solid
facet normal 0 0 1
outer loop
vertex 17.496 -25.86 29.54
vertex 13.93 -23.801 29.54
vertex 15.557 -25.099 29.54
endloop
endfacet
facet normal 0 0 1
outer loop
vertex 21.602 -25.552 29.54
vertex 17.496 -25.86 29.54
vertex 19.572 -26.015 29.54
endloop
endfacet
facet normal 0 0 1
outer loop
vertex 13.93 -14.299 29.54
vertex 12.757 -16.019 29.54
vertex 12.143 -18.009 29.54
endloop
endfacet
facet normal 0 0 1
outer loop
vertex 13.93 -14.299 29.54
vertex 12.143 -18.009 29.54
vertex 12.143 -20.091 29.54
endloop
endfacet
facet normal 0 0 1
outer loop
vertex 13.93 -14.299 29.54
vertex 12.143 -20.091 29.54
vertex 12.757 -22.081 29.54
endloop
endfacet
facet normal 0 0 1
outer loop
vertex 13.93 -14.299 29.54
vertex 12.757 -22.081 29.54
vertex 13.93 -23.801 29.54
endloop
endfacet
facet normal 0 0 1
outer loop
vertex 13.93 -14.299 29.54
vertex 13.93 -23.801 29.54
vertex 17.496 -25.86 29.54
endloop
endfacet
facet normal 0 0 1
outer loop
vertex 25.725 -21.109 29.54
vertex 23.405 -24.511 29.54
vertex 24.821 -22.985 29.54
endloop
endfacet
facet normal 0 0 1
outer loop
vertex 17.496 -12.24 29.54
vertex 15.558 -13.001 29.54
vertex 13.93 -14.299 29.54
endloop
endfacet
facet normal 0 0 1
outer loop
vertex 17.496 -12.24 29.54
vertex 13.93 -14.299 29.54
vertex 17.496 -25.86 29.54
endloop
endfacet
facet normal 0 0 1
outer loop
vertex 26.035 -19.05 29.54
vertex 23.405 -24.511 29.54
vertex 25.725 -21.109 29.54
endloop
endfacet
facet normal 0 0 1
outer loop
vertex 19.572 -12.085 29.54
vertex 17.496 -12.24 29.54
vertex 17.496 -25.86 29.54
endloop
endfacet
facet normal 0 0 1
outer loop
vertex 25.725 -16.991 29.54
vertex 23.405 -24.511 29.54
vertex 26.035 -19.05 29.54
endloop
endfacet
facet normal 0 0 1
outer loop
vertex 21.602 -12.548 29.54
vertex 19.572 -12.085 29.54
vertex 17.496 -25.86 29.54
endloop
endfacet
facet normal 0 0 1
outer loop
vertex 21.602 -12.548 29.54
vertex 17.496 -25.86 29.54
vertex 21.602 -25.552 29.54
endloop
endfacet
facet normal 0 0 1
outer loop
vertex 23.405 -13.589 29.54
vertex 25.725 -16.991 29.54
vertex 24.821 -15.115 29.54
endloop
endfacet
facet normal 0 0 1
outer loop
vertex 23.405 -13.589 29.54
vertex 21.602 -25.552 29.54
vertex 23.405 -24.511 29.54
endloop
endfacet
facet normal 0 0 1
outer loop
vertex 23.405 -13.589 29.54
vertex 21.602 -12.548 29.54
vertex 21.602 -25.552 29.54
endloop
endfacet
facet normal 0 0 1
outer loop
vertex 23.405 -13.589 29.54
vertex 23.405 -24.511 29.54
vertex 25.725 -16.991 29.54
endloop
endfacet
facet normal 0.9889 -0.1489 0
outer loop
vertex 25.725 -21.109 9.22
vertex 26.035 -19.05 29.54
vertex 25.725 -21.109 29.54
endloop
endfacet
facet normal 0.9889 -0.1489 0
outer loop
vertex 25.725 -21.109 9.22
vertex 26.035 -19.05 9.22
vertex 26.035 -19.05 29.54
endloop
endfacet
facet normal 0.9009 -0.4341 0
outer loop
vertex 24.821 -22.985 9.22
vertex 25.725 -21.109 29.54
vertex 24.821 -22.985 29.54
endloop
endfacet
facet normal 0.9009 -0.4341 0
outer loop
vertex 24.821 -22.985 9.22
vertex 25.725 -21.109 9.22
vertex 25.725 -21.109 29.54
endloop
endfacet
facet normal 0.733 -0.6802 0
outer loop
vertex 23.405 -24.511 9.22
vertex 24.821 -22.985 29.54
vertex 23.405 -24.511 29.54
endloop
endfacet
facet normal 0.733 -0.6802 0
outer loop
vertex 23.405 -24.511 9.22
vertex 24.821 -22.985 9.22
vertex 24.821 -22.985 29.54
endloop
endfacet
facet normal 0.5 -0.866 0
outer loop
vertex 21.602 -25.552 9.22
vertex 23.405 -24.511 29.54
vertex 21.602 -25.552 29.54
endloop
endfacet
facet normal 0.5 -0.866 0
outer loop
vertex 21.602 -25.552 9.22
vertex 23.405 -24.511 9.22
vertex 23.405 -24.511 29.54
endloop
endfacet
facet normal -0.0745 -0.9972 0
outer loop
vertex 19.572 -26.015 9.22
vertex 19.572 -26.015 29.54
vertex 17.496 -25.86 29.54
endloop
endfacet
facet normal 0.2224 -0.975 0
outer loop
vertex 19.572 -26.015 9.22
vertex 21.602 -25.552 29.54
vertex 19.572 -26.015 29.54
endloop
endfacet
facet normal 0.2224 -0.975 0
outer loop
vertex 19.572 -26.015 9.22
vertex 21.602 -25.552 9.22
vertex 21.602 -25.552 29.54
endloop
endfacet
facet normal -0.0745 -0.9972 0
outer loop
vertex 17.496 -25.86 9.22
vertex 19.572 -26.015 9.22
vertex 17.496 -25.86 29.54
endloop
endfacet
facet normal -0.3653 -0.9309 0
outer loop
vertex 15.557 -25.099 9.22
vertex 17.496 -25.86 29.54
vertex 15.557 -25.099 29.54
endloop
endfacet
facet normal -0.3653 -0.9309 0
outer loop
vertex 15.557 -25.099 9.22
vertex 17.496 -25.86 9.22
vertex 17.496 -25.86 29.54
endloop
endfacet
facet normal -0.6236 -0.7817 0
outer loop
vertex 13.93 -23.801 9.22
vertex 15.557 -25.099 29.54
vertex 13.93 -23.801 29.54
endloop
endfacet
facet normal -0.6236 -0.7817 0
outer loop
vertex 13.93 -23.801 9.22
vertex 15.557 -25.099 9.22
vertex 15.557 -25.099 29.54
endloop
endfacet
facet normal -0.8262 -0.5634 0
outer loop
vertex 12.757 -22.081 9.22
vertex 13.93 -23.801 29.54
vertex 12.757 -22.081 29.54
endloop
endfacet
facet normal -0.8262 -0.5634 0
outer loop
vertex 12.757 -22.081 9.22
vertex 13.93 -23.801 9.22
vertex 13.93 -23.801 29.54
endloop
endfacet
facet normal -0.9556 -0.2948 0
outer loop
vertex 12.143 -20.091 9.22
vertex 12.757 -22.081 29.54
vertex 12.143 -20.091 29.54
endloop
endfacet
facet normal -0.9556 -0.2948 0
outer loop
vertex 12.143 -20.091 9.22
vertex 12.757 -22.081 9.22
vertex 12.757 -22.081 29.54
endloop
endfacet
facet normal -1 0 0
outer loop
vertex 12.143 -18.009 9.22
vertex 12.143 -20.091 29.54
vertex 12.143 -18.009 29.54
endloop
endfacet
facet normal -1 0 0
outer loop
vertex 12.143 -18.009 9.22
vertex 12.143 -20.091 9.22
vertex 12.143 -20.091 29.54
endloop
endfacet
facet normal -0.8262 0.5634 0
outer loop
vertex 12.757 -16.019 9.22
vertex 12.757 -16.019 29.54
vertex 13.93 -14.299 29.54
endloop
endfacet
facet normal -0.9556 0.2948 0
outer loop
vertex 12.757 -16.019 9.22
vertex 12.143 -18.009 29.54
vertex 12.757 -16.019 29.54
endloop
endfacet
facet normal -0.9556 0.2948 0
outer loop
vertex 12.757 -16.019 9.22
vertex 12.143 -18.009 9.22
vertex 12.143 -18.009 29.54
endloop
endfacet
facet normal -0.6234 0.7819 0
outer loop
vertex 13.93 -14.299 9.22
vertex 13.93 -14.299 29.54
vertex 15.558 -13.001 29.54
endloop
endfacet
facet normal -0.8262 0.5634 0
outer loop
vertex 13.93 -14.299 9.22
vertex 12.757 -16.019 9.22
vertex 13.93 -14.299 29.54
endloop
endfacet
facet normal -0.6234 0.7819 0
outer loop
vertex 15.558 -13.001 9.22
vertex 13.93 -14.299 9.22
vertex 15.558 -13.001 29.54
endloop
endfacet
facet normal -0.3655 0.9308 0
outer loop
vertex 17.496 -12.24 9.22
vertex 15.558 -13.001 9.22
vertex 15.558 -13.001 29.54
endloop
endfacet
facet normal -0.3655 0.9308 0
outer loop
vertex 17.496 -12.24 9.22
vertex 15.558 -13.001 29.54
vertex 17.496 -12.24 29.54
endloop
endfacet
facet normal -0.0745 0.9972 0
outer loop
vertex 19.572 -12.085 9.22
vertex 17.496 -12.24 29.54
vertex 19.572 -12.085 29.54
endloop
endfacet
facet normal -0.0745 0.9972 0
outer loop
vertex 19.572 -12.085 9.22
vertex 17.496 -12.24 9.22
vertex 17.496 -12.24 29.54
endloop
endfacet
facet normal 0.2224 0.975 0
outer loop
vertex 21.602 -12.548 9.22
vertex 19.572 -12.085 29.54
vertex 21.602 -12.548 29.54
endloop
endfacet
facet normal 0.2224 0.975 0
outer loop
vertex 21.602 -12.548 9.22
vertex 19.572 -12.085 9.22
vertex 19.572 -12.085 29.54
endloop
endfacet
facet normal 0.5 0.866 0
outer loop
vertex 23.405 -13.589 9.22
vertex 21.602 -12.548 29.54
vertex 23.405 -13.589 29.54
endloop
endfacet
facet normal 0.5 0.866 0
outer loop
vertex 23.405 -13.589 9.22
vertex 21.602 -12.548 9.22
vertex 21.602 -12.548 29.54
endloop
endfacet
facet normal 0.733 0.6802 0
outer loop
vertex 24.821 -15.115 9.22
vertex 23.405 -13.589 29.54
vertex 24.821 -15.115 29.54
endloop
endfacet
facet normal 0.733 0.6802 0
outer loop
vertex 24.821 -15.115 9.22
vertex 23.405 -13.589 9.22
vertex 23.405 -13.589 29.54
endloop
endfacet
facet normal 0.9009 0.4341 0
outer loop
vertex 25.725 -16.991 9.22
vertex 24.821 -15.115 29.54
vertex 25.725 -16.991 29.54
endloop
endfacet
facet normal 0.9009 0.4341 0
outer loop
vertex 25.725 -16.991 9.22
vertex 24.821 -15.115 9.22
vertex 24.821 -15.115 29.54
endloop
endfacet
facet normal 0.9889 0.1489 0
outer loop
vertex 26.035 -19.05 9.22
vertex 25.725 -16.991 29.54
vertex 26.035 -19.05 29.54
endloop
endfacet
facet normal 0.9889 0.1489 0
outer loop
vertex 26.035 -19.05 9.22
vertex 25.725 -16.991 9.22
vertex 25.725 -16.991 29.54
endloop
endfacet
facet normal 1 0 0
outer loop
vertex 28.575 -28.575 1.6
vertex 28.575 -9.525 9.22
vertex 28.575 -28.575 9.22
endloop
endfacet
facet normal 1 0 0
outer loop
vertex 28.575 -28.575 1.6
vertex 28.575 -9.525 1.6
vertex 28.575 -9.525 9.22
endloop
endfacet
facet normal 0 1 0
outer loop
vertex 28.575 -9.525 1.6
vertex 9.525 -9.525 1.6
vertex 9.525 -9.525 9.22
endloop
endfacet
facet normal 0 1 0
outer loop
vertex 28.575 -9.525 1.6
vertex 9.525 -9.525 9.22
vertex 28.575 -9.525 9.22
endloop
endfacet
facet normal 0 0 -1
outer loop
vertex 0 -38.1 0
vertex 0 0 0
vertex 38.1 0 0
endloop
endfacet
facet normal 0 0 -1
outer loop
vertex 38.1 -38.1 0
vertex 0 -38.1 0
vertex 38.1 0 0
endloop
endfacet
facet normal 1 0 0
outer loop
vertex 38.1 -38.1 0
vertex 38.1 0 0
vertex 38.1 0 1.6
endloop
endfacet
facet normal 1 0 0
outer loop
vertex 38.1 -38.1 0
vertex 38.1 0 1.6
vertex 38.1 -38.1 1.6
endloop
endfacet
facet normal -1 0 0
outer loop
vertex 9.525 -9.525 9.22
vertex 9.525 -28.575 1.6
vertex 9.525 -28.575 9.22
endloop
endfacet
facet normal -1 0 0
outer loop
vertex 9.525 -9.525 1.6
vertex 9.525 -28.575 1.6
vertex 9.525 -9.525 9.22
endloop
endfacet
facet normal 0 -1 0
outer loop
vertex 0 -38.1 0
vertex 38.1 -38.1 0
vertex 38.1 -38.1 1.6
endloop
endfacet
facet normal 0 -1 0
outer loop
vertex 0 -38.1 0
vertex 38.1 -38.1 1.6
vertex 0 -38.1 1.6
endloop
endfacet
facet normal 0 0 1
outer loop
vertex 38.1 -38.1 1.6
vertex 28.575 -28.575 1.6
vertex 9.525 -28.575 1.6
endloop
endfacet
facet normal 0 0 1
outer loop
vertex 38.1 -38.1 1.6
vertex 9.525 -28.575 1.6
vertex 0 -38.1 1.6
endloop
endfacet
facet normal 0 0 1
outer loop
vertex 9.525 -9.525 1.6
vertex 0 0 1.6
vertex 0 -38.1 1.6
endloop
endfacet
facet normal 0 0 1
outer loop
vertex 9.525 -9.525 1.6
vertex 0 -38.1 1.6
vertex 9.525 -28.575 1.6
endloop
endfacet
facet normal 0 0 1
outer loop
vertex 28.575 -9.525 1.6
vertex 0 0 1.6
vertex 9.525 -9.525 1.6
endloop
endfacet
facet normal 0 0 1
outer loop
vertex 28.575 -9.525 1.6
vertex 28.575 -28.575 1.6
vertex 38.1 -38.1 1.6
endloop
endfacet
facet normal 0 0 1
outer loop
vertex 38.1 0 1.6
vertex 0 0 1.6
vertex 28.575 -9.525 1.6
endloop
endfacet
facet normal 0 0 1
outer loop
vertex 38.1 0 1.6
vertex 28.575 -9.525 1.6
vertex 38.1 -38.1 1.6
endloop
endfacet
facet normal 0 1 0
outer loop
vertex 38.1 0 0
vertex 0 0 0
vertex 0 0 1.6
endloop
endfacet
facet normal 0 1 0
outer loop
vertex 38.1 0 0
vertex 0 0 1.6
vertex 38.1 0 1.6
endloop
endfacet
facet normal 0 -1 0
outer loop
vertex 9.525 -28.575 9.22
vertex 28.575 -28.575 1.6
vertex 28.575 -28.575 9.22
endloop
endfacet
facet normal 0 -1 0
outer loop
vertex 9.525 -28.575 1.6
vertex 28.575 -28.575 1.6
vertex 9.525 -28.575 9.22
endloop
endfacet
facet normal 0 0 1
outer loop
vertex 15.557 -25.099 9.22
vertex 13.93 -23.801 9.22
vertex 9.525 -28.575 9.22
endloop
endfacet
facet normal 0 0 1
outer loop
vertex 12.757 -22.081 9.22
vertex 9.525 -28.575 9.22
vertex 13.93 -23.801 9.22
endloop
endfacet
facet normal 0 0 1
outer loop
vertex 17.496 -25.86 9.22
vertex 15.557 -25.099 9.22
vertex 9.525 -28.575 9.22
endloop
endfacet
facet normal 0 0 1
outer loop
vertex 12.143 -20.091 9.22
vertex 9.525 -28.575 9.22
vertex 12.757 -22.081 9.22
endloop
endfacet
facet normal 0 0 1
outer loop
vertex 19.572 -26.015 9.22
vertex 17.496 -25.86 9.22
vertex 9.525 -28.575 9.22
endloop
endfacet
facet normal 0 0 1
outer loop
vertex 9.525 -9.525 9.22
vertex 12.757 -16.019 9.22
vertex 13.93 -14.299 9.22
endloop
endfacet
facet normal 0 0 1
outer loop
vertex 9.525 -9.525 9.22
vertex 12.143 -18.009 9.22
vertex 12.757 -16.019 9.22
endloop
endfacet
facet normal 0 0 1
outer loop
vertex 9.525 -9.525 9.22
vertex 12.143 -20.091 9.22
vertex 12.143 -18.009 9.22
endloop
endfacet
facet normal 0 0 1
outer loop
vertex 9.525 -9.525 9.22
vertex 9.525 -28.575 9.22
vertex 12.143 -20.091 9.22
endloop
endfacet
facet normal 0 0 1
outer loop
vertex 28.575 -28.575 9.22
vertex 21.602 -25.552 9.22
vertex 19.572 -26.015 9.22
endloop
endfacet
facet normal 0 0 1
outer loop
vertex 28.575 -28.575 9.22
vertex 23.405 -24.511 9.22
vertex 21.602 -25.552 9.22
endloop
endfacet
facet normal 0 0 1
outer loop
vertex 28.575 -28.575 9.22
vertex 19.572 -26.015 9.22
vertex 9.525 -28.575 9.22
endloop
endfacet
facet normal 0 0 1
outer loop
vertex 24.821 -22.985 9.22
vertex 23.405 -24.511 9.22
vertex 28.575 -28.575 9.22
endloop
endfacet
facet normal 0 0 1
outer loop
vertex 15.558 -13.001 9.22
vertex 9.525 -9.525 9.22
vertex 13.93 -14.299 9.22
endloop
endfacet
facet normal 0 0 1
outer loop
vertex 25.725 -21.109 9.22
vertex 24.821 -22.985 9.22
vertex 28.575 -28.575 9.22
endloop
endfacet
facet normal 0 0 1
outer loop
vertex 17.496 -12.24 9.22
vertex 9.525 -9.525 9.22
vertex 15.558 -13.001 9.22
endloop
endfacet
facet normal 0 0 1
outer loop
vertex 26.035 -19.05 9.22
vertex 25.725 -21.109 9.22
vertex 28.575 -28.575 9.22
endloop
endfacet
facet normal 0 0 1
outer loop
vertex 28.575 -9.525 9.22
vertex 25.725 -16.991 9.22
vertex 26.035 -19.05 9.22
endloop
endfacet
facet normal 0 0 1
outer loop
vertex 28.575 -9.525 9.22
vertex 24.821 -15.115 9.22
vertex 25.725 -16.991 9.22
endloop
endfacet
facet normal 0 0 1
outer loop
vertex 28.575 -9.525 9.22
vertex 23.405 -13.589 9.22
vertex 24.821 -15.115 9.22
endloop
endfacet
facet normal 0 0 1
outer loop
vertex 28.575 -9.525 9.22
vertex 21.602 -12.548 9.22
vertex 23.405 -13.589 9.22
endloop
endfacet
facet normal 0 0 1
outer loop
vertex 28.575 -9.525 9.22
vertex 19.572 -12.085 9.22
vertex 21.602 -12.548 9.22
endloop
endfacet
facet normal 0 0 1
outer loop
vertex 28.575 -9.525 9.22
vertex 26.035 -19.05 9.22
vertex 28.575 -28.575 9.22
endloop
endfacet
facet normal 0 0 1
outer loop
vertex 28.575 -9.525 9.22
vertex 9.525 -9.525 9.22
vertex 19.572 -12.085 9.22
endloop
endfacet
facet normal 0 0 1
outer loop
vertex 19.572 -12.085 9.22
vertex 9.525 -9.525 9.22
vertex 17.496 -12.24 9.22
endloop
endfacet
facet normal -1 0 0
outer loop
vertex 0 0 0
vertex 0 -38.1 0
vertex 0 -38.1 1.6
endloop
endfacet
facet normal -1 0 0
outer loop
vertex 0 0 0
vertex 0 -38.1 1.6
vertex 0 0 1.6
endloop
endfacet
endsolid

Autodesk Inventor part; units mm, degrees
ref_plane "YZ Plane" through (0, 0, 0) normal (1, 0, 0) x (0, 1, 0)
ref_plane "XZ Plane" through (0, 0, 0) normal (0, 1, 0) x (-1, 0, 0)
ref_plane "XY Plane" through (0, 0, 0) normal (0, 0, 1) x (1, 0, 0)
sketch "Sketch1" plane through (0, 0, 0) normal (0, 0, 1) x (1, 0, 0)
  line L0 (0, 0) -> (38.1, 0)
  line L1 (38.1, 0) -> (38.1, -38.1)
  line L2 (38.1, -38.1) -> (0, -38.1)
  line L3 (0, -38.1) -> (0, 0)
  dimension "d0" = 38.1
  dimension "d1" = 38.1
extrude "Extrusion1" add sketch "Sketch1" along normal blind 1.6002
sketch "Sketch2" plane through (0, 0, 1.6002) normal (0, 0, 1) x (1, 0, 0)
  line L0 (38.1, 0) -> (0, 0) projected
  line L1 (0, 0) -> (0, -38.1) projected
  line L2 (0, -38.1) -> (38.1, -38.1) projected
  line L3 (38.1, -38.1) -> (38.1, 0) projected
  line L4 (9.525, -9.525) -> (28.575, -9.525)
  line L5 (28.575, -9.525) -> (28.575, -28.575)
  line L6 (28.575, -28.575) -> (9.525, -28.575)
  line L7 (9.525, -28.575) -> (9.525, -9.525)
  dimension "d4" = 9.525
  dimension "d5" = 9.525
  dimension "d6" = 9.525
  dimension "d7" = 9.525
extrude "Extrusion2" add sketch "Sketch2" along normal blind 7.62 contours L4 L5 L6 L7
sketch "Sketch3" plane through (0, 0, 9.2202) normal (0, 0, 1) x (1, 0, 0)
  circle A0 centre (19.05, -19.05) radius 6.985
  point P0 (0, 0)
  dimension "d10" = 13.97
extrude "Extrusion3" add sketch "Sketch3" along normal blind 20.32
properties part number "Camera" material "ABS Plastic"
